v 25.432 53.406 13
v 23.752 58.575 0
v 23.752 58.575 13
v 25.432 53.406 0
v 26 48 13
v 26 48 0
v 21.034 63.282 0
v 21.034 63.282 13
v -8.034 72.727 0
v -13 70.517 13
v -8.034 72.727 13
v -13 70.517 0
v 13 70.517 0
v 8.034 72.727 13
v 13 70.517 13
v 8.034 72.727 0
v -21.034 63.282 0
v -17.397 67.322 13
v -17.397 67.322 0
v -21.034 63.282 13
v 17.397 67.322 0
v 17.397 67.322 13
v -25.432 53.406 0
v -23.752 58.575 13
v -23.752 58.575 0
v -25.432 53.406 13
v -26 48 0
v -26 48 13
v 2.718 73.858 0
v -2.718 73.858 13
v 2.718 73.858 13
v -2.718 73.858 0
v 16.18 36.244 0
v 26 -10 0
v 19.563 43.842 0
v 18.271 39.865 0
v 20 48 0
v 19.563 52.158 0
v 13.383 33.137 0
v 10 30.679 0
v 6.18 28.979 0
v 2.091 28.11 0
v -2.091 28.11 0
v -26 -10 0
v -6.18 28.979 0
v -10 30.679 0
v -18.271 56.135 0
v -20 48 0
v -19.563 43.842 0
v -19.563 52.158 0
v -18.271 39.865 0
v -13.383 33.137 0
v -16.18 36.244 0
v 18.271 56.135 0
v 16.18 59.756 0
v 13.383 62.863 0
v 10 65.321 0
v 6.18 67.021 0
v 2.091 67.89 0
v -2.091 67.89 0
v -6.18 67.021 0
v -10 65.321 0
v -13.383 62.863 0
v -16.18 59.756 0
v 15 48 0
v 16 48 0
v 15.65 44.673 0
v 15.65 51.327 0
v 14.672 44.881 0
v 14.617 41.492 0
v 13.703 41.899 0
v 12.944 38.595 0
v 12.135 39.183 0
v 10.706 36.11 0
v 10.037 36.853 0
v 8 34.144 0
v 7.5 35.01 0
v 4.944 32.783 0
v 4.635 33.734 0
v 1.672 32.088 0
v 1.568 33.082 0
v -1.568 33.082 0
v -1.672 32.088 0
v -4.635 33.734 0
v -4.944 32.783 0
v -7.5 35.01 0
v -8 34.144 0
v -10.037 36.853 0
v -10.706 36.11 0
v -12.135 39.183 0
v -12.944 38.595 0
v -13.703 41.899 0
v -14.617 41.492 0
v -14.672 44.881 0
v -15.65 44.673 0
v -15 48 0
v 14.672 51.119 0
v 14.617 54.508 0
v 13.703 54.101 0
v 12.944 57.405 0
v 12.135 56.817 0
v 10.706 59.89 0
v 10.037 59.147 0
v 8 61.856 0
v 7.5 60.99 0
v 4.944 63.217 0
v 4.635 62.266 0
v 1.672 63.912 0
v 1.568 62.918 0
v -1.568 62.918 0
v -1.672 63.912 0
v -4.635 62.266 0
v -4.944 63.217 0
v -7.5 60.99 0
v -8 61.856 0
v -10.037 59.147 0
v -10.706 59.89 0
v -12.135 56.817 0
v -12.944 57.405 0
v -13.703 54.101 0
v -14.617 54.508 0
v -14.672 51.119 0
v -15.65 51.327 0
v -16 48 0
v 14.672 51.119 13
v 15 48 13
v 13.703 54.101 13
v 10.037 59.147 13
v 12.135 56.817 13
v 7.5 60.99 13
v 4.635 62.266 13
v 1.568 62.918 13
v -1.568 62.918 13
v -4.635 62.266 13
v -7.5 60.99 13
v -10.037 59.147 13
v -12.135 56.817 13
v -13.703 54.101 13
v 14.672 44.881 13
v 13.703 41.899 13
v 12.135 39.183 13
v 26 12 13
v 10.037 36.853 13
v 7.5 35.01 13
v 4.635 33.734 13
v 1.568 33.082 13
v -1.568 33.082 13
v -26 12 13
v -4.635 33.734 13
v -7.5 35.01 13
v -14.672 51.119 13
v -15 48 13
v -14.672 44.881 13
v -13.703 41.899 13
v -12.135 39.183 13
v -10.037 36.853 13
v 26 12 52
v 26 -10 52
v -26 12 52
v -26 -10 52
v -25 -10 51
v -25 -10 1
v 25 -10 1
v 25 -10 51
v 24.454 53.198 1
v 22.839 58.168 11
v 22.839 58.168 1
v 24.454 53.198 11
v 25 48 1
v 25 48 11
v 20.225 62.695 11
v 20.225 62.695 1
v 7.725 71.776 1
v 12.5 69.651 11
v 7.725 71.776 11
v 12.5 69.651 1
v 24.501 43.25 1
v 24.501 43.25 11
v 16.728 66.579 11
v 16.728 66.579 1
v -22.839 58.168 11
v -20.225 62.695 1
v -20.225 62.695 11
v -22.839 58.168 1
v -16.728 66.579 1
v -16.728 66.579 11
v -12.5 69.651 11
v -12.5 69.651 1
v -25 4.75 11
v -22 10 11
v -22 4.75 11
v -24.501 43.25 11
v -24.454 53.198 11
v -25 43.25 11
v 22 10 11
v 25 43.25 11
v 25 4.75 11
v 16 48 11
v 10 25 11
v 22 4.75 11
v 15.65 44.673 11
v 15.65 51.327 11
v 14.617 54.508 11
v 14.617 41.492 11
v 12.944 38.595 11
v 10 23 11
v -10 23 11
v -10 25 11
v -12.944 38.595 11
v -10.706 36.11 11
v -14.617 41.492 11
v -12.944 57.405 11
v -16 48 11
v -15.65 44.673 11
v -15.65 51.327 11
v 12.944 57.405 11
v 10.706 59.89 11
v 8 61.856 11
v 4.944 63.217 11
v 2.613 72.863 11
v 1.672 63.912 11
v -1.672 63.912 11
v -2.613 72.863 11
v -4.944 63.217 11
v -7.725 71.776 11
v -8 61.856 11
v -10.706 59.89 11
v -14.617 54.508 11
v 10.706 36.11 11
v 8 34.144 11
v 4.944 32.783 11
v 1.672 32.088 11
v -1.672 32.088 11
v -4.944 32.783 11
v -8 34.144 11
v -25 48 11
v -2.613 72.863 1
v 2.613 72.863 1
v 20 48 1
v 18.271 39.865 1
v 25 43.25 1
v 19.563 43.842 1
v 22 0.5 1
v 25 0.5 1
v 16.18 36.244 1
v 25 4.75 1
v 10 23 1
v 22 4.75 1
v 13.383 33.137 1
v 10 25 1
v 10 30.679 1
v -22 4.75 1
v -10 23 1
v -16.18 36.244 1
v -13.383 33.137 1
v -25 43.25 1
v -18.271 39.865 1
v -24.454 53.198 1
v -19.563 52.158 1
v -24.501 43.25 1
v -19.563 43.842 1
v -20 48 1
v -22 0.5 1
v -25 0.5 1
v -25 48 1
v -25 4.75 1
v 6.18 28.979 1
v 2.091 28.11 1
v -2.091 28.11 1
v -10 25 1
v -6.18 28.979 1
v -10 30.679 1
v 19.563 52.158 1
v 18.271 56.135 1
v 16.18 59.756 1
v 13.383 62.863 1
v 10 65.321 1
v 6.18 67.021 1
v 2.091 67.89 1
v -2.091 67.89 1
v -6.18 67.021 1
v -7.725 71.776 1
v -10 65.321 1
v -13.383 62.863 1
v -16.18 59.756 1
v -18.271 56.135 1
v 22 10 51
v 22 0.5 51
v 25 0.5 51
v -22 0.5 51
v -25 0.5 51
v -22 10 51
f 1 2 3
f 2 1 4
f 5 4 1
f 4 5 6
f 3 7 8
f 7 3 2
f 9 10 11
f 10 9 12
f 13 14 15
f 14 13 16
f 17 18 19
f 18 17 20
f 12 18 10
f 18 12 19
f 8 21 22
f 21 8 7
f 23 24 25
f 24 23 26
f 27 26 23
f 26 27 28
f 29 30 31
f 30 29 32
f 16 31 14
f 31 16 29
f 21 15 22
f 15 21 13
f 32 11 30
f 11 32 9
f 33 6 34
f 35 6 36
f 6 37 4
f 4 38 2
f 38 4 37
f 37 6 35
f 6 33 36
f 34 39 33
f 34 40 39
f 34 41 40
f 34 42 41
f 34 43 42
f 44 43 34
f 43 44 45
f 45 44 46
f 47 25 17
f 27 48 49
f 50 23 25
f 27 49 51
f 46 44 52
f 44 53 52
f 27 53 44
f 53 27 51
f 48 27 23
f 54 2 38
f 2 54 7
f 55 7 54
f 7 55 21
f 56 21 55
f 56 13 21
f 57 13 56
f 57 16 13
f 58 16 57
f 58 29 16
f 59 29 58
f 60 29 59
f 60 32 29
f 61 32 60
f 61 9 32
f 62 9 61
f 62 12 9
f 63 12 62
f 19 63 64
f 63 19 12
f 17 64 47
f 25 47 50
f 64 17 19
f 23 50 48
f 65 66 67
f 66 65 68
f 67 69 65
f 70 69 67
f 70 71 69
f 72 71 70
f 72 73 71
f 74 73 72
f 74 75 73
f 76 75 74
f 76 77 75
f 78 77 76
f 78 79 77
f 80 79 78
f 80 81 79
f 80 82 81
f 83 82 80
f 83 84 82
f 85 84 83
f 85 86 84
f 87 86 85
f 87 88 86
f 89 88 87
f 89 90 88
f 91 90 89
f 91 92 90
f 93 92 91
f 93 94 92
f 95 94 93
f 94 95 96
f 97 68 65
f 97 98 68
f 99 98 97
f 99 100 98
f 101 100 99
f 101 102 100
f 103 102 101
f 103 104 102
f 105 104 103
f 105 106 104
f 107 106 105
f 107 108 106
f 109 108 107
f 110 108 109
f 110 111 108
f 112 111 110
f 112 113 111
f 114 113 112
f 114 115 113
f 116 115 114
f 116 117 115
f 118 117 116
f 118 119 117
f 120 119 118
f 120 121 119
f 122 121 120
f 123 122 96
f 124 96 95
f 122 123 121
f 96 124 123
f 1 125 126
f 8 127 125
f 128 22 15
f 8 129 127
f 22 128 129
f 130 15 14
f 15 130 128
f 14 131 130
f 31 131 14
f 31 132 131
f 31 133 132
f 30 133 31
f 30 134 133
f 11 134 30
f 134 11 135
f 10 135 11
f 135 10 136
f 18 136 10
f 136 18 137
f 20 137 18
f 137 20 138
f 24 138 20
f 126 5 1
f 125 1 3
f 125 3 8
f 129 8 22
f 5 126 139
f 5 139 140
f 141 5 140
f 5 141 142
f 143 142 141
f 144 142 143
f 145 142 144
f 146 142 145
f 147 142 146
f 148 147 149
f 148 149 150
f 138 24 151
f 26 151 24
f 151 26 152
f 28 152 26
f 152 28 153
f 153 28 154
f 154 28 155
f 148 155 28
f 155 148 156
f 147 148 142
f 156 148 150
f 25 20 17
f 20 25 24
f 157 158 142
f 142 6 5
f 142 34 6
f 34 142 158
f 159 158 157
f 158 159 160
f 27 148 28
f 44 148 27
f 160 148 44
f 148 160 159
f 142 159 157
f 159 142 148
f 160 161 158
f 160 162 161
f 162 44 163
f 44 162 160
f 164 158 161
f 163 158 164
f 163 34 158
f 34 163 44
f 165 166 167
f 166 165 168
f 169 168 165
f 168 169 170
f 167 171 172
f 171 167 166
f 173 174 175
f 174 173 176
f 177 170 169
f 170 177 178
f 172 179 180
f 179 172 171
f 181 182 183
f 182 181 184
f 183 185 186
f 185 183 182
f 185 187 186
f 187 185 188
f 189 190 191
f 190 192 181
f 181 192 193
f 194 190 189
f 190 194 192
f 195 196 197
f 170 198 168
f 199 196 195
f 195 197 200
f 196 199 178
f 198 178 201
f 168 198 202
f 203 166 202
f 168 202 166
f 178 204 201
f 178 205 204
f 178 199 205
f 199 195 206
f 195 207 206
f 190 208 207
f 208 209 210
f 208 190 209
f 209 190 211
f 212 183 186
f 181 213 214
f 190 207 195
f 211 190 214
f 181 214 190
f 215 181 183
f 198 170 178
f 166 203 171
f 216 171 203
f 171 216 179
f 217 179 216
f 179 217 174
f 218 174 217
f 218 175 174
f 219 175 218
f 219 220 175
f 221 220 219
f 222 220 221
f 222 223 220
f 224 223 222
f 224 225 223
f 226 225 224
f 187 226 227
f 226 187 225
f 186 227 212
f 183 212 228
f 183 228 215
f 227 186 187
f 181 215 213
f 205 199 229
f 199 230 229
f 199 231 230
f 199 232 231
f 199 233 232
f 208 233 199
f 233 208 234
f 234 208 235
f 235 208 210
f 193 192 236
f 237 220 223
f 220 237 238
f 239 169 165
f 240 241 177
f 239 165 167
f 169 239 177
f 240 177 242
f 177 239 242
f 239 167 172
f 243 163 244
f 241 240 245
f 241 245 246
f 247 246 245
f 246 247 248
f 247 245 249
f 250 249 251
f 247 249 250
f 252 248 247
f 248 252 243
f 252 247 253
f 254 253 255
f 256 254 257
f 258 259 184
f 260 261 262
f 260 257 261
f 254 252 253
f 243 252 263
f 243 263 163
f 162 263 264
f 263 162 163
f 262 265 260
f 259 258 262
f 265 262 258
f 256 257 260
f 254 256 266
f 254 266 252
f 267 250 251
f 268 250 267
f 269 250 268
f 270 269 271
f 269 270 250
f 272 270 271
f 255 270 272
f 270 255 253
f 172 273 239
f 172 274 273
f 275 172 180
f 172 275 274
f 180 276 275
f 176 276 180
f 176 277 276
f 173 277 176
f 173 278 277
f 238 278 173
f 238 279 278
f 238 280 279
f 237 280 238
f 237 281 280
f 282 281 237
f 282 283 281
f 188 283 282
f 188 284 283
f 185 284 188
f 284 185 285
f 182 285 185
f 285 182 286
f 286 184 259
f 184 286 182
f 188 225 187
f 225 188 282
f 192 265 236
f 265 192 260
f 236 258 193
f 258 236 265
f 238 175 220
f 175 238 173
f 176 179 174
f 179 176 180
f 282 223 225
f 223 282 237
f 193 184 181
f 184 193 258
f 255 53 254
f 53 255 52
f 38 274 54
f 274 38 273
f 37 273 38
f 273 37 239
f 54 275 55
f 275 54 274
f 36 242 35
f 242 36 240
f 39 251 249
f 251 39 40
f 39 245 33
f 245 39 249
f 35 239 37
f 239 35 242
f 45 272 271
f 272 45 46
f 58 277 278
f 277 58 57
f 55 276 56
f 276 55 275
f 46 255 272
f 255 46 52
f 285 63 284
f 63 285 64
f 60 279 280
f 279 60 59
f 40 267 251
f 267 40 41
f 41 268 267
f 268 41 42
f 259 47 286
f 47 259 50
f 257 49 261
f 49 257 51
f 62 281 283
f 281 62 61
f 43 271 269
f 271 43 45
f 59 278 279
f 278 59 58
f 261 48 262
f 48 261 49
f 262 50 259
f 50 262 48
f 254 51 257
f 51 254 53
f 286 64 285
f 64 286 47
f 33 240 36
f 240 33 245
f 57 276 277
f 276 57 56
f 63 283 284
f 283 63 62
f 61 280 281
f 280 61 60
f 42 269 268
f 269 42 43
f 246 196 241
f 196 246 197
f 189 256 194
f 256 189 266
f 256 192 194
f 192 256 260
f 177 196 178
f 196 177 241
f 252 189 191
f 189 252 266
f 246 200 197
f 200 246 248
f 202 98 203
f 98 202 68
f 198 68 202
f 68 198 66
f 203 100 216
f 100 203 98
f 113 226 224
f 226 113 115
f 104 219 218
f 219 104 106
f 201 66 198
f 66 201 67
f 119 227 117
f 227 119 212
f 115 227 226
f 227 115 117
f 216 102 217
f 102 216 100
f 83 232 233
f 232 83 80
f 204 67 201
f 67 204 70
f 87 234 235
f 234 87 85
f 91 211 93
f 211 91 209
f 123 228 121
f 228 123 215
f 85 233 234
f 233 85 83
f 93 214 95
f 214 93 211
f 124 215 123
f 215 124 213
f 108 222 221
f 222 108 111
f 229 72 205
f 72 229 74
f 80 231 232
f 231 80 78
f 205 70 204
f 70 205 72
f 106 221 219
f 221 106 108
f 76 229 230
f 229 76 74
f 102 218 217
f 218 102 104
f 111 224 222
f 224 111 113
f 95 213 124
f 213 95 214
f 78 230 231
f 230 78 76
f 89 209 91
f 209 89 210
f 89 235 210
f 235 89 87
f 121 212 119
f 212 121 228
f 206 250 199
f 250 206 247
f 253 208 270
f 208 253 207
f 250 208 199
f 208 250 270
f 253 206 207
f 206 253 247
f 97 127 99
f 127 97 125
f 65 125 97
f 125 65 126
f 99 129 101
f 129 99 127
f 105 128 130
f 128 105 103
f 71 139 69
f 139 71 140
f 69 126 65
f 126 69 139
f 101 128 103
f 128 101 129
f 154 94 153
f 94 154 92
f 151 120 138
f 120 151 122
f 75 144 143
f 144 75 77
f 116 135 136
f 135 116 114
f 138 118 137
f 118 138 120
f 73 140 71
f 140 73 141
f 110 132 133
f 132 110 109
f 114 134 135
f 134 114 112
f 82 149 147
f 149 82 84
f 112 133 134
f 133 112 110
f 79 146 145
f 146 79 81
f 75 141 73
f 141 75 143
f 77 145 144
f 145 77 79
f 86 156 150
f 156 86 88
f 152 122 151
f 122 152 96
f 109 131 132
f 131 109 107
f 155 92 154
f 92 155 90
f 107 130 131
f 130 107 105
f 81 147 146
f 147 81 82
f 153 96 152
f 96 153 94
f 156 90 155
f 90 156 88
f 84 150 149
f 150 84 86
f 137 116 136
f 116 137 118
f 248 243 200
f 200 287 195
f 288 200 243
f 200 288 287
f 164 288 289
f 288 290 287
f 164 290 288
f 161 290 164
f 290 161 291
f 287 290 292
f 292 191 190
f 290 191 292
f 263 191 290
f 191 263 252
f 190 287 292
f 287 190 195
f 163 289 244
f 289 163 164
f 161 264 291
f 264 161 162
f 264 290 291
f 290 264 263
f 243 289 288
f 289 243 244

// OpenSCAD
lenght = 36+12;
//translate(v = [0, +6, 17]) #cube(size = [52,11,2], center = true);
difference(){
union(){
translate(v = [0, 1, 26]) cube(size = [52,22,52], center = true);
translate(v = [0, lenght/2, 6.5]) cube(size = [52,lenght,13], center = true);

translate(v = [0, lenght, 0]){
	difference(){
		translate(v = [0, 0, 6.5]) cylinder(h = 13, r=26, $fn=30, center=true);
		translate(v = [0, 0, 5]) cylinder(h = 15, r=10, $fn=30, center=true);
	}
	
}
}//end union





translate(v = [0, 5, 26]) cube(size = [44,10,50], center = true);
translate(v = [0, -5, 26]) cube(size = [50,11,50], center = true);



translate(v = [0, lenght, 0]){
	translate(v = [0, 0, 5]) cylinder(h = 20, r=15, $fn=30, center=true);
	difference(){
		union(){
			translate(v = [0, 0, 6]) cylinder(h = 10, r=25, $fn=30, center=true);
			translate(v = [0, 0, 4]) cylinder(h = 10, r=20, $fn=30, center=true);	
		translate(v = [0, (-lenght/2), 6]) cube(size = [50,lenght-9.5,10], center = true);
		}
		translate(v = [0, 0, 5]) cylinder(h = 15, r=16, $fn=30, center=true);
		translate(v = [0, -lenght/2, 6]) cube(size = [20,2,10], center = true);
		
	}
	
}

}//end Diference
